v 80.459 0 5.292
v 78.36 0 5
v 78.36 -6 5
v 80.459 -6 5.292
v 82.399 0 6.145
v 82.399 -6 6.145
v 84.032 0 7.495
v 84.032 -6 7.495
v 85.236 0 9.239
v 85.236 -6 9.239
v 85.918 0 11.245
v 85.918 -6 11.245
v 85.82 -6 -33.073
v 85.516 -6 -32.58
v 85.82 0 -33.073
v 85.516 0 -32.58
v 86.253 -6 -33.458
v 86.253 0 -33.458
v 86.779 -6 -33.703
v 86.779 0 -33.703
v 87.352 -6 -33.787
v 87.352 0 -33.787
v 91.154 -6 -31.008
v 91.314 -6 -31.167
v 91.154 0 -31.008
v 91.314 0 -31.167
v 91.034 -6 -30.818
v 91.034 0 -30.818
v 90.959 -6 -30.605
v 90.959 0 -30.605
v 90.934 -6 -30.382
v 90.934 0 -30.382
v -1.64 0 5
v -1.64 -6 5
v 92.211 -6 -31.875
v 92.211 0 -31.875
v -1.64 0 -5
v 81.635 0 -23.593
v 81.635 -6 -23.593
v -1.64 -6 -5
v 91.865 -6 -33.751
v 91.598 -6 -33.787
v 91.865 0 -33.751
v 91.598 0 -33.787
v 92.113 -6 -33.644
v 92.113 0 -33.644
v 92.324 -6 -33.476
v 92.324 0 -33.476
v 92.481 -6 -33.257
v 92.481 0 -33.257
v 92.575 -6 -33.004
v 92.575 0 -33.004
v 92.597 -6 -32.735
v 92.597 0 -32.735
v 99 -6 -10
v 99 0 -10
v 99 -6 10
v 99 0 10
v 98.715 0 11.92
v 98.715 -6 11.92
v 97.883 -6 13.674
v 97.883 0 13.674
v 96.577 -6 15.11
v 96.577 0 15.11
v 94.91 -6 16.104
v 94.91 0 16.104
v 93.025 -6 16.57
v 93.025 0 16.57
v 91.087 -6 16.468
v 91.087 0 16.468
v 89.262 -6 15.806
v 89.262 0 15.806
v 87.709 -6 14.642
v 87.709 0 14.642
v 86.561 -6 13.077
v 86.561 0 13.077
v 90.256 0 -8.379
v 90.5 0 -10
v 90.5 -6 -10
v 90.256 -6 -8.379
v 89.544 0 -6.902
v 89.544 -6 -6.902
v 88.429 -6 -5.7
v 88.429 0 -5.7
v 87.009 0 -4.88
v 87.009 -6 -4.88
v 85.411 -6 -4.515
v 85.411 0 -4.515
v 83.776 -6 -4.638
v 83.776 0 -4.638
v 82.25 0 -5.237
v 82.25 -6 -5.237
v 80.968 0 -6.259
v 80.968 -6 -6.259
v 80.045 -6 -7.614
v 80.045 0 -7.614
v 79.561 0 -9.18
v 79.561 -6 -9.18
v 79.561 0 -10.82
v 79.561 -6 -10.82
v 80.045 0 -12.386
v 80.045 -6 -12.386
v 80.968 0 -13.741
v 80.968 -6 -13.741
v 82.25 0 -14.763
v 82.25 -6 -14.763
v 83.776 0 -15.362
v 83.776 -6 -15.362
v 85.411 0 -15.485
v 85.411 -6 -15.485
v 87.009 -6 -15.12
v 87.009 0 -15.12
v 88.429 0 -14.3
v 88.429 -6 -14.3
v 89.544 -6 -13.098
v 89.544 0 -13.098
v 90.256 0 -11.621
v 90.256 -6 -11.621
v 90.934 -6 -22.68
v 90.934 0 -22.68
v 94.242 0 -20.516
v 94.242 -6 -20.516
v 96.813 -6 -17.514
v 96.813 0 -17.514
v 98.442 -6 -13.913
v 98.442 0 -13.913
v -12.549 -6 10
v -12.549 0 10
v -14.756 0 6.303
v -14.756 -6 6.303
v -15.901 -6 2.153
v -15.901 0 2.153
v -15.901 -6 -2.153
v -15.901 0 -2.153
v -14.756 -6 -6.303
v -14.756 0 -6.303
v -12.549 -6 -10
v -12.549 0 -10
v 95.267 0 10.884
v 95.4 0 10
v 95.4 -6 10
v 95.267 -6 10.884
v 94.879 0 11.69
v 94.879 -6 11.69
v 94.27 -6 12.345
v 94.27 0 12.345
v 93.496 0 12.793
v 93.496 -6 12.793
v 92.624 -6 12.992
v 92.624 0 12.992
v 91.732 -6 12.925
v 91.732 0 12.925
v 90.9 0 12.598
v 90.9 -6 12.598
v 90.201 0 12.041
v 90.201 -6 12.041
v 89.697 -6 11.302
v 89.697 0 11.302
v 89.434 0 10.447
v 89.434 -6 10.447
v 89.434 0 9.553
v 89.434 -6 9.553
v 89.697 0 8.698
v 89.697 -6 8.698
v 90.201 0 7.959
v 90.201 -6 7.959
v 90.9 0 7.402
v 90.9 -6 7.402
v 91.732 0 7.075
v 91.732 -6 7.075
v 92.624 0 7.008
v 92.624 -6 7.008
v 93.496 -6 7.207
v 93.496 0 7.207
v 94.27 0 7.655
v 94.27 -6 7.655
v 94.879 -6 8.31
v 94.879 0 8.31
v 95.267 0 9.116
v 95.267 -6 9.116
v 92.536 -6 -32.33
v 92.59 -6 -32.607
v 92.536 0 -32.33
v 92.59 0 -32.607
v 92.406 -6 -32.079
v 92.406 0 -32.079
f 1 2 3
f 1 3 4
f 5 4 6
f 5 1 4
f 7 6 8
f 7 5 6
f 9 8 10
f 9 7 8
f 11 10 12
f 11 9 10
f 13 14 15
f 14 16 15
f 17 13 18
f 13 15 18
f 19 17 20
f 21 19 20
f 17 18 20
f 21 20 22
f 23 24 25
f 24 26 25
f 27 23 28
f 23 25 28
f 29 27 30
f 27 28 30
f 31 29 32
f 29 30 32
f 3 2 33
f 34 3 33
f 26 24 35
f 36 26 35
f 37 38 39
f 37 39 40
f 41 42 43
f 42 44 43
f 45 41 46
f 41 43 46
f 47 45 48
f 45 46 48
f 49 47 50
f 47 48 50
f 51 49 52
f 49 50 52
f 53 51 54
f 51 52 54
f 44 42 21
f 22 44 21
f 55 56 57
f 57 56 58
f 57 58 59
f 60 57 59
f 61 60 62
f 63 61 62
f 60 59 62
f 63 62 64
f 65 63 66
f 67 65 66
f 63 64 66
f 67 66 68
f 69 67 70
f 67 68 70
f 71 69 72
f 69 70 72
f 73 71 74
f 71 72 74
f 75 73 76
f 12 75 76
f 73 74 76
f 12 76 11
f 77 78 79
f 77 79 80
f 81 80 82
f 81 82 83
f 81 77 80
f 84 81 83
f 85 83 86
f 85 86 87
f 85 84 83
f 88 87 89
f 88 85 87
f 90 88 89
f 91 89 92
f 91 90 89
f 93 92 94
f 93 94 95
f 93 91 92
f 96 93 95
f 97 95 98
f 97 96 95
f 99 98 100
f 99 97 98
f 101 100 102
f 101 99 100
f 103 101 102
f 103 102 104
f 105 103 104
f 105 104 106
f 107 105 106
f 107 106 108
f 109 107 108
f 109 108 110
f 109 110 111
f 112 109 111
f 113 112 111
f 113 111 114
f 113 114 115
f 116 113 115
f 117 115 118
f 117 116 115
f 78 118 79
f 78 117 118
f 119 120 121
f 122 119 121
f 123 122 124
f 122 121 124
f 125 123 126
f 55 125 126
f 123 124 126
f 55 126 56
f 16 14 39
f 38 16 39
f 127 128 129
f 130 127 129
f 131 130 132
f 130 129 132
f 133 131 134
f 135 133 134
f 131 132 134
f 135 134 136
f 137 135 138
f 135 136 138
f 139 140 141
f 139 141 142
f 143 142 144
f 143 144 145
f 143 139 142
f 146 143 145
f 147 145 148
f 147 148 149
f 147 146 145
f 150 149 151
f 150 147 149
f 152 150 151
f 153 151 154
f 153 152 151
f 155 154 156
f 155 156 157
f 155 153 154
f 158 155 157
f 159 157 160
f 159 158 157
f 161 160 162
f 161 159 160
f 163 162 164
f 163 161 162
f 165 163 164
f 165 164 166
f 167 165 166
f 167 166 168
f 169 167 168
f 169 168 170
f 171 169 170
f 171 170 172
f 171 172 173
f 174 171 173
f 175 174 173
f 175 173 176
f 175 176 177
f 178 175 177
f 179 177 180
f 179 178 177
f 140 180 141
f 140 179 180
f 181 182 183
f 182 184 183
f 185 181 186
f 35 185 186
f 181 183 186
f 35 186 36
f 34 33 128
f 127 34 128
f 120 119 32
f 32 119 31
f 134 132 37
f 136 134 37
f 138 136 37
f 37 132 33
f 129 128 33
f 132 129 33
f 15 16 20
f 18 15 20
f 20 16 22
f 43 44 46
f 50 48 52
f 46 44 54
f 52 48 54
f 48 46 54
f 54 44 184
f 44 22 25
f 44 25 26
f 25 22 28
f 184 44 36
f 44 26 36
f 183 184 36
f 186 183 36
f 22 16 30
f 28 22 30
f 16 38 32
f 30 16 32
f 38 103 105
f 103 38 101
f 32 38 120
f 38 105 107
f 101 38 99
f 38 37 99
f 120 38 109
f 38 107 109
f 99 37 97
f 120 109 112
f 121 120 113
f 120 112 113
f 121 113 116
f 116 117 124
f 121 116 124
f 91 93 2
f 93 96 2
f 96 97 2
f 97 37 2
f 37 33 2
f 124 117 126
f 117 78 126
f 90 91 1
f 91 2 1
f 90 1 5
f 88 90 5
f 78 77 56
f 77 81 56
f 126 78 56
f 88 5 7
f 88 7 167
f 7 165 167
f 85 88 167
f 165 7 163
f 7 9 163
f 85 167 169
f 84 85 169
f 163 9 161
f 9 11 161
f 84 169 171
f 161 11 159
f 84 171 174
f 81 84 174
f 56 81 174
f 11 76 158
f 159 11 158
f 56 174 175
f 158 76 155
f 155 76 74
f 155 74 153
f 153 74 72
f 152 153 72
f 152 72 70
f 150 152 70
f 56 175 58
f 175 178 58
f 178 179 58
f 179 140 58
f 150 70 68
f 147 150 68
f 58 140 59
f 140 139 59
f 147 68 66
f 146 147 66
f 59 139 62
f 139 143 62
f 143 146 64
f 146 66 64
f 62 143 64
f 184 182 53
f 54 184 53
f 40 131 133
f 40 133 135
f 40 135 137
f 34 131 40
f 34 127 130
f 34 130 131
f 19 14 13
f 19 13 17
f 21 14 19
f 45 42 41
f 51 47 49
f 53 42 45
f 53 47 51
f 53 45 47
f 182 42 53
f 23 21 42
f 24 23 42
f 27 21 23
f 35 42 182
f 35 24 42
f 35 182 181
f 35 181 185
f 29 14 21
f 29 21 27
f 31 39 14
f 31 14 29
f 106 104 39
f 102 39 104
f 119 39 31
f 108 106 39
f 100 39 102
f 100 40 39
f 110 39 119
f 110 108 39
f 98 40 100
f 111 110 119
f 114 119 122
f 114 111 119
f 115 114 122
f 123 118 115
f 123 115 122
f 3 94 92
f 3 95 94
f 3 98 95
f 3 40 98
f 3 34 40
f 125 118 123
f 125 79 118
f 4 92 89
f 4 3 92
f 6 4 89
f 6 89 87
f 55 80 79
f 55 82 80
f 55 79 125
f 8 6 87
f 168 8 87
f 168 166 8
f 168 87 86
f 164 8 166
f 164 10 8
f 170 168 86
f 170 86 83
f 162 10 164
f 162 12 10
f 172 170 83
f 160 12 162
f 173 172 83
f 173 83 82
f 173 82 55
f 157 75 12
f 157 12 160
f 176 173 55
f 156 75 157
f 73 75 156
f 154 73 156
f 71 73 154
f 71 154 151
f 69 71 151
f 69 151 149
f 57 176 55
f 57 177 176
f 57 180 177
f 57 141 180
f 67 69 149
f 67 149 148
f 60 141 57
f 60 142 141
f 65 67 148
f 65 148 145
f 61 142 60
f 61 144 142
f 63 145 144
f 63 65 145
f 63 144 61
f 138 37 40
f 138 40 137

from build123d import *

# Parameters (mm, degrees)
SKETCH_R     = 3
SKETCH_R_2   = 5.5
PAD_DEPTH    = 6
PAD001_DEPTH = 6
FILLET_R     = 2
FILLET001_R  = 1
FILLET002_R  = 1
FILLET003_R  = 1


with BuildPart() as part:
    # Sketch → Pad (new body)
    with BuildSketch(Plane.XZ):
        with BuildLine():
            ThreePointArc((-12.548712, 10), (-16.045877, 0), (-12.548712, -10))
            Line((-1.64, -5), (-12.548712, -10))
            Line((81.949241, -23.66356), (-1.64, -5))
            ThreePointArc((81.949241, -23.66356), (93.754695, -20.924986), (99, -10))
            Line((99, -10), (99, 10))
            ThreePointArc((99, 10), (93.025256, 16.570316), (85.918468, 11.244888))
            ThreePointArc((78.36, 5), (83.262272, 6.763181), (85.918468, 11.244888))
            Line((78.36, 5), (-1.64, 5))
            Line((-1.64, 5), (-12.548712, 10))
        make_face()
        with Locations((92.4, 10)):
            Circle(SKETCH_R, mode=Mode.SUBTRACT)
        with Locations((85, -10)):
            Circle(SKETCH_R_2, mode=Mode.SUBTRACT)
    extrude(amount=PAD_DEPTH)

    # Sketch004 (on Face13 of Pad) → Pad001 (join)
    with BuildSketch(Plane.XZ.offset(6)):
        Polygon((81.14045, -22.447344), (90.934021, -21.502348), (90.934021, -30.866373), (92.566284, -32.155006), (92.652191, -33.787262), (86.037239, -33.787262), align=None)
    extrude(amount=-PAD001_DEPTH)

    # Fillet
    fillet_edges = [part.edges().sort_by_distance(p)[0] for p in [
        (86.037239, -3, -33.787262),
    ]]
    fillet(fillet_edges, radius=FILLET_R)

    # Fillet001
    fillet001_edges = [part.edges().sort_by_distance(p)[0] for p in [
        (92.652191, -3, -33.787262),
    ]]
    fillet(fillet001_edges, radius=FILLET001_R)

    # Fillet002
    fillet002_edges = [part.edges().sort_by_distance(p)[0] for p in [
        (92.566284, -3, -32.155006),
    ]]
    fillet(fillet002_edges, radius=FILLET002_R)

    # Fillet003
    fillet003_edges = [part.edges().sort_by_distance(p)[0] for p in [
        (90.934021, -3, -30.866373),
    ]]
    fillet(fillet003_edges, radius=FILLET003_R)


solid = part.part
